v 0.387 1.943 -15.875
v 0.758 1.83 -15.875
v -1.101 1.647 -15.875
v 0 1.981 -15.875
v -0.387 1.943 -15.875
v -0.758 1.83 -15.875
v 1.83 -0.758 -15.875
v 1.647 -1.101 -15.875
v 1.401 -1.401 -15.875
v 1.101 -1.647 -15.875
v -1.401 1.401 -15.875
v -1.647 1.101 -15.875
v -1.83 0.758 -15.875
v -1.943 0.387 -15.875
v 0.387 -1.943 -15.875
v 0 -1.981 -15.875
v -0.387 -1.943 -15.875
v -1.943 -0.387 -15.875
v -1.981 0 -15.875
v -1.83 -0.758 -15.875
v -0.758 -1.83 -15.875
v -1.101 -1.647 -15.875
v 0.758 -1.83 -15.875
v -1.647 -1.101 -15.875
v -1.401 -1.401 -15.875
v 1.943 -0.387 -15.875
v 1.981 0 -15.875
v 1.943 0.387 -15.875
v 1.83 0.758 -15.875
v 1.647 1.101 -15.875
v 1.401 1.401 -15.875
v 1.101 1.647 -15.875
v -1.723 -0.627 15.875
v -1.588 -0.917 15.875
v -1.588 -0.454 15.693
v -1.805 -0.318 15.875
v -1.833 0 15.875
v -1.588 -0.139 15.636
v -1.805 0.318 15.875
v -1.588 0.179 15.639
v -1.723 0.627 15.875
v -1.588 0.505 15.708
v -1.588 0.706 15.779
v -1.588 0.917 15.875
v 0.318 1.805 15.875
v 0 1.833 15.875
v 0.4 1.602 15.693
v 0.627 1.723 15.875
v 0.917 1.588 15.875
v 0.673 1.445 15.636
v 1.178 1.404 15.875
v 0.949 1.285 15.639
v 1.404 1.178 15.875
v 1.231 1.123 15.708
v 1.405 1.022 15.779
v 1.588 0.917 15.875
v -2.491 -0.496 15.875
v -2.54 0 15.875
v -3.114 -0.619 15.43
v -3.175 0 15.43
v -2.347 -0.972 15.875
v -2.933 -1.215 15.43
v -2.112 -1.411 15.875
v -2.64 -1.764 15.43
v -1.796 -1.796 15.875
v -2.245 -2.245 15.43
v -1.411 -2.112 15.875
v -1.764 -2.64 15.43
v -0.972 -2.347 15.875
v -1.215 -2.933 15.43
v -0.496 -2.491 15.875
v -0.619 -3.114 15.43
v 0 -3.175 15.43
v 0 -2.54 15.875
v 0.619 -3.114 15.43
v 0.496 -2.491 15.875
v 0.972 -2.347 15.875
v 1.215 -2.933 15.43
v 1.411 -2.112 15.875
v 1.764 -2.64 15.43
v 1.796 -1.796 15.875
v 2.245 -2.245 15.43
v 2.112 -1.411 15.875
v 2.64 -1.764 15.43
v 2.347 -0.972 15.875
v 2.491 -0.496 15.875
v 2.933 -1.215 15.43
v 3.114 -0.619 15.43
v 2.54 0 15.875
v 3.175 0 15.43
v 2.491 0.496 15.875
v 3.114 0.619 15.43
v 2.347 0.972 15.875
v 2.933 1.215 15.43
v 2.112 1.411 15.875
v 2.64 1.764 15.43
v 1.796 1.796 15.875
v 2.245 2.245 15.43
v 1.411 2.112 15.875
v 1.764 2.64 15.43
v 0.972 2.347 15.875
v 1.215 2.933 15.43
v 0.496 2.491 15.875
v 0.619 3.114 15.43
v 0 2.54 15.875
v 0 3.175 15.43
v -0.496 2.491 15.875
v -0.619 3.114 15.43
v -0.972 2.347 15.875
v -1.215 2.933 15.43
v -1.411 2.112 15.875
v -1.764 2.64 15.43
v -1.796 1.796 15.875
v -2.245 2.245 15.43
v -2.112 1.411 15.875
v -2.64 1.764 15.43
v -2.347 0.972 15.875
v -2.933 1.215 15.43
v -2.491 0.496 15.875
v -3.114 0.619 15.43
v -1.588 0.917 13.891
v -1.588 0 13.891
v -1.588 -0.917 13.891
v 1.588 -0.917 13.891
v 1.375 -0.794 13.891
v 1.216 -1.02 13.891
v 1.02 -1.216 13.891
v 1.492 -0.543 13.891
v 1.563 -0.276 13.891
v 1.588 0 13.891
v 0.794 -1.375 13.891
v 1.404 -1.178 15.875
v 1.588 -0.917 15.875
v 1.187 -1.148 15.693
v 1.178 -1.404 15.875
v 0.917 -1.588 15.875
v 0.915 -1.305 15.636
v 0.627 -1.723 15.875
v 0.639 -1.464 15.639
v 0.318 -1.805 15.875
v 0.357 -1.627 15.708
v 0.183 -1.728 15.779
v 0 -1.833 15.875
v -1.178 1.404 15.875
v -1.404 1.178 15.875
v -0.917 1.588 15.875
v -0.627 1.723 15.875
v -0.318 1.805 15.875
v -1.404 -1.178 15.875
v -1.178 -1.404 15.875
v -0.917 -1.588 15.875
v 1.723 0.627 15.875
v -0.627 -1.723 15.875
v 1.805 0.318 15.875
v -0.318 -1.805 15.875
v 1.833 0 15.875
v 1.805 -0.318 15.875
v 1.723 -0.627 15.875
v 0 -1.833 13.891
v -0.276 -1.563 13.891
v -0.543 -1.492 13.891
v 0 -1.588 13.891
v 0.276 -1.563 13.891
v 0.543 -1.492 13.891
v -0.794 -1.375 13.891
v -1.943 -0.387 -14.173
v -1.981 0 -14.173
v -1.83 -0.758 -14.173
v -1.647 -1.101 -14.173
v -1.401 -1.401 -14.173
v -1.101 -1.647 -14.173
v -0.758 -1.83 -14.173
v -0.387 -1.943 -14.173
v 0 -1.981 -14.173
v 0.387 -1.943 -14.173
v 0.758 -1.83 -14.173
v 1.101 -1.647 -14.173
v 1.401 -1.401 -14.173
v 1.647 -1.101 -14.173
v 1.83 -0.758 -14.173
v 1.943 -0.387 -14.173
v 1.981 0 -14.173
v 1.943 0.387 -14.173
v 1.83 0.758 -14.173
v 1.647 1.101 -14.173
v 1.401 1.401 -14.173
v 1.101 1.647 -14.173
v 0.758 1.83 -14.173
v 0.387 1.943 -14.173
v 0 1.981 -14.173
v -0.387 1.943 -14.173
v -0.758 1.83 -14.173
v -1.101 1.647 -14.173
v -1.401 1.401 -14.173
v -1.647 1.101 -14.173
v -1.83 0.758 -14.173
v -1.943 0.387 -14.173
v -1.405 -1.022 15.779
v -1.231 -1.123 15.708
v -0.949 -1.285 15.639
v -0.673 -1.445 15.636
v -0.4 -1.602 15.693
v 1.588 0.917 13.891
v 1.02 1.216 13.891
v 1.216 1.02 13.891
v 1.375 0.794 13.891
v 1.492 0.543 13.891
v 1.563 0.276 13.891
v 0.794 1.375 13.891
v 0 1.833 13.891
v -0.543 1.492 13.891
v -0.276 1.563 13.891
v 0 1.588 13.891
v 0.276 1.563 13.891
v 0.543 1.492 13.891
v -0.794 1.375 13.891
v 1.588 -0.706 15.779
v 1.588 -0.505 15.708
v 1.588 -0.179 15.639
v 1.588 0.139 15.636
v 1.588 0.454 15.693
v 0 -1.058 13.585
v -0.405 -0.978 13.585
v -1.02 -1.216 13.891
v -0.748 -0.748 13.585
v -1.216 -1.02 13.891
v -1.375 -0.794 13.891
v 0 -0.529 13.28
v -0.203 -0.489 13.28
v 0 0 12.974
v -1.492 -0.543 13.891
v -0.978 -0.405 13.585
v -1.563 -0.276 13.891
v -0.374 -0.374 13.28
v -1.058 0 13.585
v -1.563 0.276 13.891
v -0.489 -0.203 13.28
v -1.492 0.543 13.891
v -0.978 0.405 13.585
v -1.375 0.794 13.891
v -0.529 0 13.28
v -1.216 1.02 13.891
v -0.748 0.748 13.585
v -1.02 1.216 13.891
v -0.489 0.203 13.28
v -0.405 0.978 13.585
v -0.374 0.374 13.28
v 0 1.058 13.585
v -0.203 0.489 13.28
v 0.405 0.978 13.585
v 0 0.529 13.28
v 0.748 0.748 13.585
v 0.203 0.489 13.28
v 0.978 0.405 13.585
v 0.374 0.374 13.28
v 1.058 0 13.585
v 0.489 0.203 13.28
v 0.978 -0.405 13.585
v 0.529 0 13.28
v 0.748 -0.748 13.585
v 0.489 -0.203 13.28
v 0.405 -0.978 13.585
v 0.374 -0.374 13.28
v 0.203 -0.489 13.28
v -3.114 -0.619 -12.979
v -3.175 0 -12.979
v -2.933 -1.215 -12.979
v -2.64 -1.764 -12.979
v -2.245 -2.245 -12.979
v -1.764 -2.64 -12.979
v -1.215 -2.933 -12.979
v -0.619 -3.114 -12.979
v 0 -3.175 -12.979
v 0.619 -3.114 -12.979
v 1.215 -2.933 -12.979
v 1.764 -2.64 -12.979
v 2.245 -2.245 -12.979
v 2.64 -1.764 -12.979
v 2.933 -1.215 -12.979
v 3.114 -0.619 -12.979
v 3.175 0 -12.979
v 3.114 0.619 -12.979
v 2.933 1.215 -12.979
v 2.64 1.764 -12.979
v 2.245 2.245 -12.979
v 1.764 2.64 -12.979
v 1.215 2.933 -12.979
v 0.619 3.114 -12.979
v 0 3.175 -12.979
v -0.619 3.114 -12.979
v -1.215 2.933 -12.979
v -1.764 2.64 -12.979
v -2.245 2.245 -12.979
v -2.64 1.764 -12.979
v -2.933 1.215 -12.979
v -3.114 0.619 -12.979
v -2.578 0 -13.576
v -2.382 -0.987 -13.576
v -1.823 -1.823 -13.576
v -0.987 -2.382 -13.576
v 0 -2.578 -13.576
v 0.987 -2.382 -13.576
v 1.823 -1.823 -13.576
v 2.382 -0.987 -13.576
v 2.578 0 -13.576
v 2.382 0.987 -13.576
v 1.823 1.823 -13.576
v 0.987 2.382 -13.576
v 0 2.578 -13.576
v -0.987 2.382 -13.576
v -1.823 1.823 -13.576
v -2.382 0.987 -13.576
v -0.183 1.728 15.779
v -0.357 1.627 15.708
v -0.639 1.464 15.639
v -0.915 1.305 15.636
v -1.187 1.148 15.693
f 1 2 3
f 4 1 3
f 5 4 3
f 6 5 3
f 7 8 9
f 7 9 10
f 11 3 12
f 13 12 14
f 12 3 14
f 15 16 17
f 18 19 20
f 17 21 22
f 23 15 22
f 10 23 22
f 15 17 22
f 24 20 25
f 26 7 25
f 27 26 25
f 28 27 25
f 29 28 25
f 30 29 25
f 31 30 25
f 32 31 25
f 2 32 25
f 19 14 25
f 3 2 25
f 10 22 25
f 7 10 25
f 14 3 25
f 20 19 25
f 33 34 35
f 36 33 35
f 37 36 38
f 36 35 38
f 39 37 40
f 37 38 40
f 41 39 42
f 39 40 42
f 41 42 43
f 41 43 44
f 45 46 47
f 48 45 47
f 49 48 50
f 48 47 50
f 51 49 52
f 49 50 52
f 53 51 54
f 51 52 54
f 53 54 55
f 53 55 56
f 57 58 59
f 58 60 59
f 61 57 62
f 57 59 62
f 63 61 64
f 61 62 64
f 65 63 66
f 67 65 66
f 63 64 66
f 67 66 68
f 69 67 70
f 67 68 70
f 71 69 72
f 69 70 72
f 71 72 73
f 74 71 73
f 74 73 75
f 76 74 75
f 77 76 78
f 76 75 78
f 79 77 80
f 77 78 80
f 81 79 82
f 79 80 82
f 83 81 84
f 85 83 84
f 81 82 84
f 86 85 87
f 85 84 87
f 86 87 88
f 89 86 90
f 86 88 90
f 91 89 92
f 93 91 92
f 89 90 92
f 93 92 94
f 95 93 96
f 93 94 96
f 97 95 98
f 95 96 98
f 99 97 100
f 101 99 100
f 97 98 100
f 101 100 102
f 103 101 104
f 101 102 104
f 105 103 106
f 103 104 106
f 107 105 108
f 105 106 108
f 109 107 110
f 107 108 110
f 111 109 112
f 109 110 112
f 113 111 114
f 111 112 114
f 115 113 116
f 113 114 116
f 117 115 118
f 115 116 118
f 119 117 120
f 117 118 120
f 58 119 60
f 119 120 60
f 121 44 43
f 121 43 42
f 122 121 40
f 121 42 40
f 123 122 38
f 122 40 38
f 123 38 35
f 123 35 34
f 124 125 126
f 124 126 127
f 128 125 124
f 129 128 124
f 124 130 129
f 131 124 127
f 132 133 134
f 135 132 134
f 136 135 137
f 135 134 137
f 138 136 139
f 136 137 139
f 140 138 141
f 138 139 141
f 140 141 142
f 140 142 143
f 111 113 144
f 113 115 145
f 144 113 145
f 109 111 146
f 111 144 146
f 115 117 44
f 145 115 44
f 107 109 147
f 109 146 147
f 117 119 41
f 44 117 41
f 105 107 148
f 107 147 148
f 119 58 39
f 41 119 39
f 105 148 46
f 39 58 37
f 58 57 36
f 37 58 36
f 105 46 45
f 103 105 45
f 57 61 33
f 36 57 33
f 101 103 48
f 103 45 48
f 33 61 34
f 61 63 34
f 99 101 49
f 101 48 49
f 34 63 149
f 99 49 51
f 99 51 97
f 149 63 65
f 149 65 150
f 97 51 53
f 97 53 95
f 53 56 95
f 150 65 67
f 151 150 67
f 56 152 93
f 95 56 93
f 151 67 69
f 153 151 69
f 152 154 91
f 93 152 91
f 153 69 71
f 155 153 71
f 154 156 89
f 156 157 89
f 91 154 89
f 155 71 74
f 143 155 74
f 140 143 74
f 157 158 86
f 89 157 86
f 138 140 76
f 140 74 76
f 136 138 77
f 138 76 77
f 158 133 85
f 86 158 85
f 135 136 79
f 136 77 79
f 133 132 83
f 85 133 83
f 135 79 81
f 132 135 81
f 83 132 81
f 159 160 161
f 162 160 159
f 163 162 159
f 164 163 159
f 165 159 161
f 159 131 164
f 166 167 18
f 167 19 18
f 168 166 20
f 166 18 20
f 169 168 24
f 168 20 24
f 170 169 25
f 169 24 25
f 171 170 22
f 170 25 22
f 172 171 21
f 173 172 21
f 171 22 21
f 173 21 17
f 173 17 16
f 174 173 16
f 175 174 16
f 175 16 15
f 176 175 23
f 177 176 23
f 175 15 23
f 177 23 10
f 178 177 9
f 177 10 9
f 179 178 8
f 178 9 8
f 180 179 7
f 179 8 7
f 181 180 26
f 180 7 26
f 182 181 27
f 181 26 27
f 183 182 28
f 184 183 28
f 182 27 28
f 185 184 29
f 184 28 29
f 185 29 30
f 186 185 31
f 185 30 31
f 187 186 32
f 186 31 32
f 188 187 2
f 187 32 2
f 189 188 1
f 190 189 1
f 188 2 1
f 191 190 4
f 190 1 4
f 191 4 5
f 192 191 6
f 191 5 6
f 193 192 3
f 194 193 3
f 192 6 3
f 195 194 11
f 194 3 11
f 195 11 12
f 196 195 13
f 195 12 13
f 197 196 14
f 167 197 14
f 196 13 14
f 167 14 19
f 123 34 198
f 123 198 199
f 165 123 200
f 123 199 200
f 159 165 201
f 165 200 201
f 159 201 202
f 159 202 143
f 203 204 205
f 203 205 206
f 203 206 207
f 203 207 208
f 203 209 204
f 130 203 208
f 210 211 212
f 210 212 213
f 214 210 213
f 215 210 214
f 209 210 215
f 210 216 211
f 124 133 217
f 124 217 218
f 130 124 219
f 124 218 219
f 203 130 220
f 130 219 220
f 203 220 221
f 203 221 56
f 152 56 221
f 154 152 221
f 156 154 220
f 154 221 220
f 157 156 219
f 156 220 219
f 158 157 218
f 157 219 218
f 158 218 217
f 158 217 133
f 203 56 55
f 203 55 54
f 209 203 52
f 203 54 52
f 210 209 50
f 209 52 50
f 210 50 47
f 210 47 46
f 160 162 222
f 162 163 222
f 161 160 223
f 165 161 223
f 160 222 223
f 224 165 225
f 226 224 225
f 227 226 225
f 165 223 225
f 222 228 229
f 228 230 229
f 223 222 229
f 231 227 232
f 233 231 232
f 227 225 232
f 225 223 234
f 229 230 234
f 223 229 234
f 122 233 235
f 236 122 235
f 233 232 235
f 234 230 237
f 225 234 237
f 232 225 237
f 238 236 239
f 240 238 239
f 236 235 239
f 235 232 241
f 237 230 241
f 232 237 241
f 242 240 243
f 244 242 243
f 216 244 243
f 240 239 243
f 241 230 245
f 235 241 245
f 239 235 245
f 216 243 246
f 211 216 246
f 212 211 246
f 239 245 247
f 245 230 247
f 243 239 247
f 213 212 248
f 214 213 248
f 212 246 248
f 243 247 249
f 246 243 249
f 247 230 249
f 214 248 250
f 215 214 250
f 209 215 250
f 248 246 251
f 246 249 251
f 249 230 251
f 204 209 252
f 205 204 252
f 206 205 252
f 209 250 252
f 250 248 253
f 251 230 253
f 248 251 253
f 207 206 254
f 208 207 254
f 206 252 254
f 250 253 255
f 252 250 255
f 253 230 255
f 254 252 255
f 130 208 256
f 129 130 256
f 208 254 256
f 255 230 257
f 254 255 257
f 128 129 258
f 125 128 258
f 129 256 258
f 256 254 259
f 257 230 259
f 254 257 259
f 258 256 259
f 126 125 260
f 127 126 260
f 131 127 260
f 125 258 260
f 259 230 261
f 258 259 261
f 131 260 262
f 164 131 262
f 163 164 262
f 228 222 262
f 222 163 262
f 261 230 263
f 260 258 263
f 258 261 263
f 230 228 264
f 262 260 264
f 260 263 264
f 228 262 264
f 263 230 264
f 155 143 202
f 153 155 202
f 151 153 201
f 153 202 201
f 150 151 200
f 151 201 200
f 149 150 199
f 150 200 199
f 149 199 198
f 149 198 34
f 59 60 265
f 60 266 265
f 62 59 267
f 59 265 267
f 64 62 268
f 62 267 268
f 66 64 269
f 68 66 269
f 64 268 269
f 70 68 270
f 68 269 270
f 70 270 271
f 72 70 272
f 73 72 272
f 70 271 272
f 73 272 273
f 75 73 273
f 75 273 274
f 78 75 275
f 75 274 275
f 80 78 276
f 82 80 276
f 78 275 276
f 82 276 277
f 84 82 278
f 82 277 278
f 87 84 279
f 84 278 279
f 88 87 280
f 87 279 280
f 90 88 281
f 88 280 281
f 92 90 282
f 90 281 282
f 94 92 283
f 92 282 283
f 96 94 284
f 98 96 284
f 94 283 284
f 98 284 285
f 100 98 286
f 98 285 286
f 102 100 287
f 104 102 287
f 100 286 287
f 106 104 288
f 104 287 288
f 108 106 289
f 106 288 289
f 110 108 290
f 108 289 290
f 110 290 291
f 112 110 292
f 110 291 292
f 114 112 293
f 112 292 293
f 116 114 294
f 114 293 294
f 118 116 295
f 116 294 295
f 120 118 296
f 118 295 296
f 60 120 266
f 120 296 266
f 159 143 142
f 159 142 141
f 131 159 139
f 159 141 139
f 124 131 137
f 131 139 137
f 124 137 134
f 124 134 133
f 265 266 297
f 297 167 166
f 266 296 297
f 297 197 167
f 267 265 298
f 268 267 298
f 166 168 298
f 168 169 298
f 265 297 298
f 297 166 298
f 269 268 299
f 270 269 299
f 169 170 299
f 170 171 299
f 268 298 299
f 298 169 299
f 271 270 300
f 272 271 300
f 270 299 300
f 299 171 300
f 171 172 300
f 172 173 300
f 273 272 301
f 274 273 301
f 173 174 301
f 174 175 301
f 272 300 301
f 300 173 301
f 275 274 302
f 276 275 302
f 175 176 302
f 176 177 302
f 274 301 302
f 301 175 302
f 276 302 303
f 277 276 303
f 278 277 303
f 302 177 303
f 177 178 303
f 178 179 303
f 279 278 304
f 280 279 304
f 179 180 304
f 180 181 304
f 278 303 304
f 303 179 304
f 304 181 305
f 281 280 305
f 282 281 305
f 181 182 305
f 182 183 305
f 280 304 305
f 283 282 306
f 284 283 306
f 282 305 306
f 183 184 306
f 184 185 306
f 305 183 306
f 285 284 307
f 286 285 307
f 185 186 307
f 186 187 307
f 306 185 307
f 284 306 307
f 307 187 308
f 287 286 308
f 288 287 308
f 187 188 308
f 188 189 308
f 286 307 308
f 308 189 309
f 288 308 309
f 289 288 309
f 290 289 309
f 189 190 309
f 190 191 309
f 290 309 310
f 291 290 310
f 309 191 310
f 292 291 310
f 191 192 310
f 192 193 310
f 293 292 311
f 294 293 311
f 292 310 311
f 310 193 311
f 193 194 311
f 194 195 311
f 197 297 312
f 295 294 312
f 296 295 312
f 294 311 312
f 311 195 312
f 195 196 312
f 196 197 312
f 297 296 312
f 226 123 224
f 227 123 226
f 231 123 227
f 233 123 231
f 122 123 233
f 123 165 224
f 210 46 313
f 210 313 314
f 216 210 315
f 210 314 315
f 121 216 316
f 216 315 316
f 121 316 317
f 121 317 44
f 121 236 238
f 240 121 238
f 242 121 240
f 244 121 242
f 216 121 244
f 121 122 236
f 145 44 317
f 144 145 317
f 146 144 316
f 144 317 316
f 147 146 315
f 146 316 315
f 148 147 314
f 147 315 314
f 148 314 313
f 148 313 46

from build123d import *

# Parameters (mm, degrees)
CUT_EXTRUDE10_DEPTH = 1.984375


with BuildPart() as part:
    # Sketch22 → Revolve1 (revolve)
    with BuildSketch(Plane(origin=(0, 0, 0), x_dir=(0, 0, -1), z_dir=(1, 0, 0))):
        Polygon((-15.875, 0), (-15.875, 2.54), (-15.430368213, 3.175), (12.9794, 3.175), (14.1732, 1.9812), (15.875, 1.9812), (15.875, 0), align=None)
    revolve(axis=Axis((0, 0, -15.875), (0, 0, 1)))

    # Sketch23 → Cut-Extrude10 (cut)
    with BuildSketch(Plane.XY.offset(15.875)):
        Polygon((0, 1.833087105), (-1.5875, 0.916543552), (-1.5875, -0.916543552), (0, -1.833087105), (1.5875, -0.916543552), (1.5875, 0.916543552), align=None)
    extrude(amount=-CUT_EXTRUDE10_DEPTH, mode=Mode.SUBTRACT)

    # Cut-Extrude11 cone 1 section (through the dimple's axis) → Cut-Extrude11 (revolve, cut)
    with BuildSketch(Plane(origin=(0, 0, 15.875), x_dir=(0, -1, 0), z_dir=(1, 0, 0))):
        Polygon((0, 0), (1.833087105, 0), (0, 1.833087105), align=None)
    revolve(axis=Axis((0, 0, 15.875), (0, 0, -1)), mode=Mode.SUBTRACT)

    # Cut-Extrude12 cone 1 section (through the dimple's axis) → Cut-Extrude12 (revolve, cut)
    with BuildSketch(Plane(origin=(0, 0, 13.890625), x_dir=(0, -1, 0), z_dir=(1, 0, 0))):
        Polygon((0, 0), (1.5875, 0), (0, 0.916543552), align=None)
    revolve(axis=Axis((0, 0, 13.890625), (0, 0, -1)), mode=Mode.SUBTRACT)


solid = part.part
